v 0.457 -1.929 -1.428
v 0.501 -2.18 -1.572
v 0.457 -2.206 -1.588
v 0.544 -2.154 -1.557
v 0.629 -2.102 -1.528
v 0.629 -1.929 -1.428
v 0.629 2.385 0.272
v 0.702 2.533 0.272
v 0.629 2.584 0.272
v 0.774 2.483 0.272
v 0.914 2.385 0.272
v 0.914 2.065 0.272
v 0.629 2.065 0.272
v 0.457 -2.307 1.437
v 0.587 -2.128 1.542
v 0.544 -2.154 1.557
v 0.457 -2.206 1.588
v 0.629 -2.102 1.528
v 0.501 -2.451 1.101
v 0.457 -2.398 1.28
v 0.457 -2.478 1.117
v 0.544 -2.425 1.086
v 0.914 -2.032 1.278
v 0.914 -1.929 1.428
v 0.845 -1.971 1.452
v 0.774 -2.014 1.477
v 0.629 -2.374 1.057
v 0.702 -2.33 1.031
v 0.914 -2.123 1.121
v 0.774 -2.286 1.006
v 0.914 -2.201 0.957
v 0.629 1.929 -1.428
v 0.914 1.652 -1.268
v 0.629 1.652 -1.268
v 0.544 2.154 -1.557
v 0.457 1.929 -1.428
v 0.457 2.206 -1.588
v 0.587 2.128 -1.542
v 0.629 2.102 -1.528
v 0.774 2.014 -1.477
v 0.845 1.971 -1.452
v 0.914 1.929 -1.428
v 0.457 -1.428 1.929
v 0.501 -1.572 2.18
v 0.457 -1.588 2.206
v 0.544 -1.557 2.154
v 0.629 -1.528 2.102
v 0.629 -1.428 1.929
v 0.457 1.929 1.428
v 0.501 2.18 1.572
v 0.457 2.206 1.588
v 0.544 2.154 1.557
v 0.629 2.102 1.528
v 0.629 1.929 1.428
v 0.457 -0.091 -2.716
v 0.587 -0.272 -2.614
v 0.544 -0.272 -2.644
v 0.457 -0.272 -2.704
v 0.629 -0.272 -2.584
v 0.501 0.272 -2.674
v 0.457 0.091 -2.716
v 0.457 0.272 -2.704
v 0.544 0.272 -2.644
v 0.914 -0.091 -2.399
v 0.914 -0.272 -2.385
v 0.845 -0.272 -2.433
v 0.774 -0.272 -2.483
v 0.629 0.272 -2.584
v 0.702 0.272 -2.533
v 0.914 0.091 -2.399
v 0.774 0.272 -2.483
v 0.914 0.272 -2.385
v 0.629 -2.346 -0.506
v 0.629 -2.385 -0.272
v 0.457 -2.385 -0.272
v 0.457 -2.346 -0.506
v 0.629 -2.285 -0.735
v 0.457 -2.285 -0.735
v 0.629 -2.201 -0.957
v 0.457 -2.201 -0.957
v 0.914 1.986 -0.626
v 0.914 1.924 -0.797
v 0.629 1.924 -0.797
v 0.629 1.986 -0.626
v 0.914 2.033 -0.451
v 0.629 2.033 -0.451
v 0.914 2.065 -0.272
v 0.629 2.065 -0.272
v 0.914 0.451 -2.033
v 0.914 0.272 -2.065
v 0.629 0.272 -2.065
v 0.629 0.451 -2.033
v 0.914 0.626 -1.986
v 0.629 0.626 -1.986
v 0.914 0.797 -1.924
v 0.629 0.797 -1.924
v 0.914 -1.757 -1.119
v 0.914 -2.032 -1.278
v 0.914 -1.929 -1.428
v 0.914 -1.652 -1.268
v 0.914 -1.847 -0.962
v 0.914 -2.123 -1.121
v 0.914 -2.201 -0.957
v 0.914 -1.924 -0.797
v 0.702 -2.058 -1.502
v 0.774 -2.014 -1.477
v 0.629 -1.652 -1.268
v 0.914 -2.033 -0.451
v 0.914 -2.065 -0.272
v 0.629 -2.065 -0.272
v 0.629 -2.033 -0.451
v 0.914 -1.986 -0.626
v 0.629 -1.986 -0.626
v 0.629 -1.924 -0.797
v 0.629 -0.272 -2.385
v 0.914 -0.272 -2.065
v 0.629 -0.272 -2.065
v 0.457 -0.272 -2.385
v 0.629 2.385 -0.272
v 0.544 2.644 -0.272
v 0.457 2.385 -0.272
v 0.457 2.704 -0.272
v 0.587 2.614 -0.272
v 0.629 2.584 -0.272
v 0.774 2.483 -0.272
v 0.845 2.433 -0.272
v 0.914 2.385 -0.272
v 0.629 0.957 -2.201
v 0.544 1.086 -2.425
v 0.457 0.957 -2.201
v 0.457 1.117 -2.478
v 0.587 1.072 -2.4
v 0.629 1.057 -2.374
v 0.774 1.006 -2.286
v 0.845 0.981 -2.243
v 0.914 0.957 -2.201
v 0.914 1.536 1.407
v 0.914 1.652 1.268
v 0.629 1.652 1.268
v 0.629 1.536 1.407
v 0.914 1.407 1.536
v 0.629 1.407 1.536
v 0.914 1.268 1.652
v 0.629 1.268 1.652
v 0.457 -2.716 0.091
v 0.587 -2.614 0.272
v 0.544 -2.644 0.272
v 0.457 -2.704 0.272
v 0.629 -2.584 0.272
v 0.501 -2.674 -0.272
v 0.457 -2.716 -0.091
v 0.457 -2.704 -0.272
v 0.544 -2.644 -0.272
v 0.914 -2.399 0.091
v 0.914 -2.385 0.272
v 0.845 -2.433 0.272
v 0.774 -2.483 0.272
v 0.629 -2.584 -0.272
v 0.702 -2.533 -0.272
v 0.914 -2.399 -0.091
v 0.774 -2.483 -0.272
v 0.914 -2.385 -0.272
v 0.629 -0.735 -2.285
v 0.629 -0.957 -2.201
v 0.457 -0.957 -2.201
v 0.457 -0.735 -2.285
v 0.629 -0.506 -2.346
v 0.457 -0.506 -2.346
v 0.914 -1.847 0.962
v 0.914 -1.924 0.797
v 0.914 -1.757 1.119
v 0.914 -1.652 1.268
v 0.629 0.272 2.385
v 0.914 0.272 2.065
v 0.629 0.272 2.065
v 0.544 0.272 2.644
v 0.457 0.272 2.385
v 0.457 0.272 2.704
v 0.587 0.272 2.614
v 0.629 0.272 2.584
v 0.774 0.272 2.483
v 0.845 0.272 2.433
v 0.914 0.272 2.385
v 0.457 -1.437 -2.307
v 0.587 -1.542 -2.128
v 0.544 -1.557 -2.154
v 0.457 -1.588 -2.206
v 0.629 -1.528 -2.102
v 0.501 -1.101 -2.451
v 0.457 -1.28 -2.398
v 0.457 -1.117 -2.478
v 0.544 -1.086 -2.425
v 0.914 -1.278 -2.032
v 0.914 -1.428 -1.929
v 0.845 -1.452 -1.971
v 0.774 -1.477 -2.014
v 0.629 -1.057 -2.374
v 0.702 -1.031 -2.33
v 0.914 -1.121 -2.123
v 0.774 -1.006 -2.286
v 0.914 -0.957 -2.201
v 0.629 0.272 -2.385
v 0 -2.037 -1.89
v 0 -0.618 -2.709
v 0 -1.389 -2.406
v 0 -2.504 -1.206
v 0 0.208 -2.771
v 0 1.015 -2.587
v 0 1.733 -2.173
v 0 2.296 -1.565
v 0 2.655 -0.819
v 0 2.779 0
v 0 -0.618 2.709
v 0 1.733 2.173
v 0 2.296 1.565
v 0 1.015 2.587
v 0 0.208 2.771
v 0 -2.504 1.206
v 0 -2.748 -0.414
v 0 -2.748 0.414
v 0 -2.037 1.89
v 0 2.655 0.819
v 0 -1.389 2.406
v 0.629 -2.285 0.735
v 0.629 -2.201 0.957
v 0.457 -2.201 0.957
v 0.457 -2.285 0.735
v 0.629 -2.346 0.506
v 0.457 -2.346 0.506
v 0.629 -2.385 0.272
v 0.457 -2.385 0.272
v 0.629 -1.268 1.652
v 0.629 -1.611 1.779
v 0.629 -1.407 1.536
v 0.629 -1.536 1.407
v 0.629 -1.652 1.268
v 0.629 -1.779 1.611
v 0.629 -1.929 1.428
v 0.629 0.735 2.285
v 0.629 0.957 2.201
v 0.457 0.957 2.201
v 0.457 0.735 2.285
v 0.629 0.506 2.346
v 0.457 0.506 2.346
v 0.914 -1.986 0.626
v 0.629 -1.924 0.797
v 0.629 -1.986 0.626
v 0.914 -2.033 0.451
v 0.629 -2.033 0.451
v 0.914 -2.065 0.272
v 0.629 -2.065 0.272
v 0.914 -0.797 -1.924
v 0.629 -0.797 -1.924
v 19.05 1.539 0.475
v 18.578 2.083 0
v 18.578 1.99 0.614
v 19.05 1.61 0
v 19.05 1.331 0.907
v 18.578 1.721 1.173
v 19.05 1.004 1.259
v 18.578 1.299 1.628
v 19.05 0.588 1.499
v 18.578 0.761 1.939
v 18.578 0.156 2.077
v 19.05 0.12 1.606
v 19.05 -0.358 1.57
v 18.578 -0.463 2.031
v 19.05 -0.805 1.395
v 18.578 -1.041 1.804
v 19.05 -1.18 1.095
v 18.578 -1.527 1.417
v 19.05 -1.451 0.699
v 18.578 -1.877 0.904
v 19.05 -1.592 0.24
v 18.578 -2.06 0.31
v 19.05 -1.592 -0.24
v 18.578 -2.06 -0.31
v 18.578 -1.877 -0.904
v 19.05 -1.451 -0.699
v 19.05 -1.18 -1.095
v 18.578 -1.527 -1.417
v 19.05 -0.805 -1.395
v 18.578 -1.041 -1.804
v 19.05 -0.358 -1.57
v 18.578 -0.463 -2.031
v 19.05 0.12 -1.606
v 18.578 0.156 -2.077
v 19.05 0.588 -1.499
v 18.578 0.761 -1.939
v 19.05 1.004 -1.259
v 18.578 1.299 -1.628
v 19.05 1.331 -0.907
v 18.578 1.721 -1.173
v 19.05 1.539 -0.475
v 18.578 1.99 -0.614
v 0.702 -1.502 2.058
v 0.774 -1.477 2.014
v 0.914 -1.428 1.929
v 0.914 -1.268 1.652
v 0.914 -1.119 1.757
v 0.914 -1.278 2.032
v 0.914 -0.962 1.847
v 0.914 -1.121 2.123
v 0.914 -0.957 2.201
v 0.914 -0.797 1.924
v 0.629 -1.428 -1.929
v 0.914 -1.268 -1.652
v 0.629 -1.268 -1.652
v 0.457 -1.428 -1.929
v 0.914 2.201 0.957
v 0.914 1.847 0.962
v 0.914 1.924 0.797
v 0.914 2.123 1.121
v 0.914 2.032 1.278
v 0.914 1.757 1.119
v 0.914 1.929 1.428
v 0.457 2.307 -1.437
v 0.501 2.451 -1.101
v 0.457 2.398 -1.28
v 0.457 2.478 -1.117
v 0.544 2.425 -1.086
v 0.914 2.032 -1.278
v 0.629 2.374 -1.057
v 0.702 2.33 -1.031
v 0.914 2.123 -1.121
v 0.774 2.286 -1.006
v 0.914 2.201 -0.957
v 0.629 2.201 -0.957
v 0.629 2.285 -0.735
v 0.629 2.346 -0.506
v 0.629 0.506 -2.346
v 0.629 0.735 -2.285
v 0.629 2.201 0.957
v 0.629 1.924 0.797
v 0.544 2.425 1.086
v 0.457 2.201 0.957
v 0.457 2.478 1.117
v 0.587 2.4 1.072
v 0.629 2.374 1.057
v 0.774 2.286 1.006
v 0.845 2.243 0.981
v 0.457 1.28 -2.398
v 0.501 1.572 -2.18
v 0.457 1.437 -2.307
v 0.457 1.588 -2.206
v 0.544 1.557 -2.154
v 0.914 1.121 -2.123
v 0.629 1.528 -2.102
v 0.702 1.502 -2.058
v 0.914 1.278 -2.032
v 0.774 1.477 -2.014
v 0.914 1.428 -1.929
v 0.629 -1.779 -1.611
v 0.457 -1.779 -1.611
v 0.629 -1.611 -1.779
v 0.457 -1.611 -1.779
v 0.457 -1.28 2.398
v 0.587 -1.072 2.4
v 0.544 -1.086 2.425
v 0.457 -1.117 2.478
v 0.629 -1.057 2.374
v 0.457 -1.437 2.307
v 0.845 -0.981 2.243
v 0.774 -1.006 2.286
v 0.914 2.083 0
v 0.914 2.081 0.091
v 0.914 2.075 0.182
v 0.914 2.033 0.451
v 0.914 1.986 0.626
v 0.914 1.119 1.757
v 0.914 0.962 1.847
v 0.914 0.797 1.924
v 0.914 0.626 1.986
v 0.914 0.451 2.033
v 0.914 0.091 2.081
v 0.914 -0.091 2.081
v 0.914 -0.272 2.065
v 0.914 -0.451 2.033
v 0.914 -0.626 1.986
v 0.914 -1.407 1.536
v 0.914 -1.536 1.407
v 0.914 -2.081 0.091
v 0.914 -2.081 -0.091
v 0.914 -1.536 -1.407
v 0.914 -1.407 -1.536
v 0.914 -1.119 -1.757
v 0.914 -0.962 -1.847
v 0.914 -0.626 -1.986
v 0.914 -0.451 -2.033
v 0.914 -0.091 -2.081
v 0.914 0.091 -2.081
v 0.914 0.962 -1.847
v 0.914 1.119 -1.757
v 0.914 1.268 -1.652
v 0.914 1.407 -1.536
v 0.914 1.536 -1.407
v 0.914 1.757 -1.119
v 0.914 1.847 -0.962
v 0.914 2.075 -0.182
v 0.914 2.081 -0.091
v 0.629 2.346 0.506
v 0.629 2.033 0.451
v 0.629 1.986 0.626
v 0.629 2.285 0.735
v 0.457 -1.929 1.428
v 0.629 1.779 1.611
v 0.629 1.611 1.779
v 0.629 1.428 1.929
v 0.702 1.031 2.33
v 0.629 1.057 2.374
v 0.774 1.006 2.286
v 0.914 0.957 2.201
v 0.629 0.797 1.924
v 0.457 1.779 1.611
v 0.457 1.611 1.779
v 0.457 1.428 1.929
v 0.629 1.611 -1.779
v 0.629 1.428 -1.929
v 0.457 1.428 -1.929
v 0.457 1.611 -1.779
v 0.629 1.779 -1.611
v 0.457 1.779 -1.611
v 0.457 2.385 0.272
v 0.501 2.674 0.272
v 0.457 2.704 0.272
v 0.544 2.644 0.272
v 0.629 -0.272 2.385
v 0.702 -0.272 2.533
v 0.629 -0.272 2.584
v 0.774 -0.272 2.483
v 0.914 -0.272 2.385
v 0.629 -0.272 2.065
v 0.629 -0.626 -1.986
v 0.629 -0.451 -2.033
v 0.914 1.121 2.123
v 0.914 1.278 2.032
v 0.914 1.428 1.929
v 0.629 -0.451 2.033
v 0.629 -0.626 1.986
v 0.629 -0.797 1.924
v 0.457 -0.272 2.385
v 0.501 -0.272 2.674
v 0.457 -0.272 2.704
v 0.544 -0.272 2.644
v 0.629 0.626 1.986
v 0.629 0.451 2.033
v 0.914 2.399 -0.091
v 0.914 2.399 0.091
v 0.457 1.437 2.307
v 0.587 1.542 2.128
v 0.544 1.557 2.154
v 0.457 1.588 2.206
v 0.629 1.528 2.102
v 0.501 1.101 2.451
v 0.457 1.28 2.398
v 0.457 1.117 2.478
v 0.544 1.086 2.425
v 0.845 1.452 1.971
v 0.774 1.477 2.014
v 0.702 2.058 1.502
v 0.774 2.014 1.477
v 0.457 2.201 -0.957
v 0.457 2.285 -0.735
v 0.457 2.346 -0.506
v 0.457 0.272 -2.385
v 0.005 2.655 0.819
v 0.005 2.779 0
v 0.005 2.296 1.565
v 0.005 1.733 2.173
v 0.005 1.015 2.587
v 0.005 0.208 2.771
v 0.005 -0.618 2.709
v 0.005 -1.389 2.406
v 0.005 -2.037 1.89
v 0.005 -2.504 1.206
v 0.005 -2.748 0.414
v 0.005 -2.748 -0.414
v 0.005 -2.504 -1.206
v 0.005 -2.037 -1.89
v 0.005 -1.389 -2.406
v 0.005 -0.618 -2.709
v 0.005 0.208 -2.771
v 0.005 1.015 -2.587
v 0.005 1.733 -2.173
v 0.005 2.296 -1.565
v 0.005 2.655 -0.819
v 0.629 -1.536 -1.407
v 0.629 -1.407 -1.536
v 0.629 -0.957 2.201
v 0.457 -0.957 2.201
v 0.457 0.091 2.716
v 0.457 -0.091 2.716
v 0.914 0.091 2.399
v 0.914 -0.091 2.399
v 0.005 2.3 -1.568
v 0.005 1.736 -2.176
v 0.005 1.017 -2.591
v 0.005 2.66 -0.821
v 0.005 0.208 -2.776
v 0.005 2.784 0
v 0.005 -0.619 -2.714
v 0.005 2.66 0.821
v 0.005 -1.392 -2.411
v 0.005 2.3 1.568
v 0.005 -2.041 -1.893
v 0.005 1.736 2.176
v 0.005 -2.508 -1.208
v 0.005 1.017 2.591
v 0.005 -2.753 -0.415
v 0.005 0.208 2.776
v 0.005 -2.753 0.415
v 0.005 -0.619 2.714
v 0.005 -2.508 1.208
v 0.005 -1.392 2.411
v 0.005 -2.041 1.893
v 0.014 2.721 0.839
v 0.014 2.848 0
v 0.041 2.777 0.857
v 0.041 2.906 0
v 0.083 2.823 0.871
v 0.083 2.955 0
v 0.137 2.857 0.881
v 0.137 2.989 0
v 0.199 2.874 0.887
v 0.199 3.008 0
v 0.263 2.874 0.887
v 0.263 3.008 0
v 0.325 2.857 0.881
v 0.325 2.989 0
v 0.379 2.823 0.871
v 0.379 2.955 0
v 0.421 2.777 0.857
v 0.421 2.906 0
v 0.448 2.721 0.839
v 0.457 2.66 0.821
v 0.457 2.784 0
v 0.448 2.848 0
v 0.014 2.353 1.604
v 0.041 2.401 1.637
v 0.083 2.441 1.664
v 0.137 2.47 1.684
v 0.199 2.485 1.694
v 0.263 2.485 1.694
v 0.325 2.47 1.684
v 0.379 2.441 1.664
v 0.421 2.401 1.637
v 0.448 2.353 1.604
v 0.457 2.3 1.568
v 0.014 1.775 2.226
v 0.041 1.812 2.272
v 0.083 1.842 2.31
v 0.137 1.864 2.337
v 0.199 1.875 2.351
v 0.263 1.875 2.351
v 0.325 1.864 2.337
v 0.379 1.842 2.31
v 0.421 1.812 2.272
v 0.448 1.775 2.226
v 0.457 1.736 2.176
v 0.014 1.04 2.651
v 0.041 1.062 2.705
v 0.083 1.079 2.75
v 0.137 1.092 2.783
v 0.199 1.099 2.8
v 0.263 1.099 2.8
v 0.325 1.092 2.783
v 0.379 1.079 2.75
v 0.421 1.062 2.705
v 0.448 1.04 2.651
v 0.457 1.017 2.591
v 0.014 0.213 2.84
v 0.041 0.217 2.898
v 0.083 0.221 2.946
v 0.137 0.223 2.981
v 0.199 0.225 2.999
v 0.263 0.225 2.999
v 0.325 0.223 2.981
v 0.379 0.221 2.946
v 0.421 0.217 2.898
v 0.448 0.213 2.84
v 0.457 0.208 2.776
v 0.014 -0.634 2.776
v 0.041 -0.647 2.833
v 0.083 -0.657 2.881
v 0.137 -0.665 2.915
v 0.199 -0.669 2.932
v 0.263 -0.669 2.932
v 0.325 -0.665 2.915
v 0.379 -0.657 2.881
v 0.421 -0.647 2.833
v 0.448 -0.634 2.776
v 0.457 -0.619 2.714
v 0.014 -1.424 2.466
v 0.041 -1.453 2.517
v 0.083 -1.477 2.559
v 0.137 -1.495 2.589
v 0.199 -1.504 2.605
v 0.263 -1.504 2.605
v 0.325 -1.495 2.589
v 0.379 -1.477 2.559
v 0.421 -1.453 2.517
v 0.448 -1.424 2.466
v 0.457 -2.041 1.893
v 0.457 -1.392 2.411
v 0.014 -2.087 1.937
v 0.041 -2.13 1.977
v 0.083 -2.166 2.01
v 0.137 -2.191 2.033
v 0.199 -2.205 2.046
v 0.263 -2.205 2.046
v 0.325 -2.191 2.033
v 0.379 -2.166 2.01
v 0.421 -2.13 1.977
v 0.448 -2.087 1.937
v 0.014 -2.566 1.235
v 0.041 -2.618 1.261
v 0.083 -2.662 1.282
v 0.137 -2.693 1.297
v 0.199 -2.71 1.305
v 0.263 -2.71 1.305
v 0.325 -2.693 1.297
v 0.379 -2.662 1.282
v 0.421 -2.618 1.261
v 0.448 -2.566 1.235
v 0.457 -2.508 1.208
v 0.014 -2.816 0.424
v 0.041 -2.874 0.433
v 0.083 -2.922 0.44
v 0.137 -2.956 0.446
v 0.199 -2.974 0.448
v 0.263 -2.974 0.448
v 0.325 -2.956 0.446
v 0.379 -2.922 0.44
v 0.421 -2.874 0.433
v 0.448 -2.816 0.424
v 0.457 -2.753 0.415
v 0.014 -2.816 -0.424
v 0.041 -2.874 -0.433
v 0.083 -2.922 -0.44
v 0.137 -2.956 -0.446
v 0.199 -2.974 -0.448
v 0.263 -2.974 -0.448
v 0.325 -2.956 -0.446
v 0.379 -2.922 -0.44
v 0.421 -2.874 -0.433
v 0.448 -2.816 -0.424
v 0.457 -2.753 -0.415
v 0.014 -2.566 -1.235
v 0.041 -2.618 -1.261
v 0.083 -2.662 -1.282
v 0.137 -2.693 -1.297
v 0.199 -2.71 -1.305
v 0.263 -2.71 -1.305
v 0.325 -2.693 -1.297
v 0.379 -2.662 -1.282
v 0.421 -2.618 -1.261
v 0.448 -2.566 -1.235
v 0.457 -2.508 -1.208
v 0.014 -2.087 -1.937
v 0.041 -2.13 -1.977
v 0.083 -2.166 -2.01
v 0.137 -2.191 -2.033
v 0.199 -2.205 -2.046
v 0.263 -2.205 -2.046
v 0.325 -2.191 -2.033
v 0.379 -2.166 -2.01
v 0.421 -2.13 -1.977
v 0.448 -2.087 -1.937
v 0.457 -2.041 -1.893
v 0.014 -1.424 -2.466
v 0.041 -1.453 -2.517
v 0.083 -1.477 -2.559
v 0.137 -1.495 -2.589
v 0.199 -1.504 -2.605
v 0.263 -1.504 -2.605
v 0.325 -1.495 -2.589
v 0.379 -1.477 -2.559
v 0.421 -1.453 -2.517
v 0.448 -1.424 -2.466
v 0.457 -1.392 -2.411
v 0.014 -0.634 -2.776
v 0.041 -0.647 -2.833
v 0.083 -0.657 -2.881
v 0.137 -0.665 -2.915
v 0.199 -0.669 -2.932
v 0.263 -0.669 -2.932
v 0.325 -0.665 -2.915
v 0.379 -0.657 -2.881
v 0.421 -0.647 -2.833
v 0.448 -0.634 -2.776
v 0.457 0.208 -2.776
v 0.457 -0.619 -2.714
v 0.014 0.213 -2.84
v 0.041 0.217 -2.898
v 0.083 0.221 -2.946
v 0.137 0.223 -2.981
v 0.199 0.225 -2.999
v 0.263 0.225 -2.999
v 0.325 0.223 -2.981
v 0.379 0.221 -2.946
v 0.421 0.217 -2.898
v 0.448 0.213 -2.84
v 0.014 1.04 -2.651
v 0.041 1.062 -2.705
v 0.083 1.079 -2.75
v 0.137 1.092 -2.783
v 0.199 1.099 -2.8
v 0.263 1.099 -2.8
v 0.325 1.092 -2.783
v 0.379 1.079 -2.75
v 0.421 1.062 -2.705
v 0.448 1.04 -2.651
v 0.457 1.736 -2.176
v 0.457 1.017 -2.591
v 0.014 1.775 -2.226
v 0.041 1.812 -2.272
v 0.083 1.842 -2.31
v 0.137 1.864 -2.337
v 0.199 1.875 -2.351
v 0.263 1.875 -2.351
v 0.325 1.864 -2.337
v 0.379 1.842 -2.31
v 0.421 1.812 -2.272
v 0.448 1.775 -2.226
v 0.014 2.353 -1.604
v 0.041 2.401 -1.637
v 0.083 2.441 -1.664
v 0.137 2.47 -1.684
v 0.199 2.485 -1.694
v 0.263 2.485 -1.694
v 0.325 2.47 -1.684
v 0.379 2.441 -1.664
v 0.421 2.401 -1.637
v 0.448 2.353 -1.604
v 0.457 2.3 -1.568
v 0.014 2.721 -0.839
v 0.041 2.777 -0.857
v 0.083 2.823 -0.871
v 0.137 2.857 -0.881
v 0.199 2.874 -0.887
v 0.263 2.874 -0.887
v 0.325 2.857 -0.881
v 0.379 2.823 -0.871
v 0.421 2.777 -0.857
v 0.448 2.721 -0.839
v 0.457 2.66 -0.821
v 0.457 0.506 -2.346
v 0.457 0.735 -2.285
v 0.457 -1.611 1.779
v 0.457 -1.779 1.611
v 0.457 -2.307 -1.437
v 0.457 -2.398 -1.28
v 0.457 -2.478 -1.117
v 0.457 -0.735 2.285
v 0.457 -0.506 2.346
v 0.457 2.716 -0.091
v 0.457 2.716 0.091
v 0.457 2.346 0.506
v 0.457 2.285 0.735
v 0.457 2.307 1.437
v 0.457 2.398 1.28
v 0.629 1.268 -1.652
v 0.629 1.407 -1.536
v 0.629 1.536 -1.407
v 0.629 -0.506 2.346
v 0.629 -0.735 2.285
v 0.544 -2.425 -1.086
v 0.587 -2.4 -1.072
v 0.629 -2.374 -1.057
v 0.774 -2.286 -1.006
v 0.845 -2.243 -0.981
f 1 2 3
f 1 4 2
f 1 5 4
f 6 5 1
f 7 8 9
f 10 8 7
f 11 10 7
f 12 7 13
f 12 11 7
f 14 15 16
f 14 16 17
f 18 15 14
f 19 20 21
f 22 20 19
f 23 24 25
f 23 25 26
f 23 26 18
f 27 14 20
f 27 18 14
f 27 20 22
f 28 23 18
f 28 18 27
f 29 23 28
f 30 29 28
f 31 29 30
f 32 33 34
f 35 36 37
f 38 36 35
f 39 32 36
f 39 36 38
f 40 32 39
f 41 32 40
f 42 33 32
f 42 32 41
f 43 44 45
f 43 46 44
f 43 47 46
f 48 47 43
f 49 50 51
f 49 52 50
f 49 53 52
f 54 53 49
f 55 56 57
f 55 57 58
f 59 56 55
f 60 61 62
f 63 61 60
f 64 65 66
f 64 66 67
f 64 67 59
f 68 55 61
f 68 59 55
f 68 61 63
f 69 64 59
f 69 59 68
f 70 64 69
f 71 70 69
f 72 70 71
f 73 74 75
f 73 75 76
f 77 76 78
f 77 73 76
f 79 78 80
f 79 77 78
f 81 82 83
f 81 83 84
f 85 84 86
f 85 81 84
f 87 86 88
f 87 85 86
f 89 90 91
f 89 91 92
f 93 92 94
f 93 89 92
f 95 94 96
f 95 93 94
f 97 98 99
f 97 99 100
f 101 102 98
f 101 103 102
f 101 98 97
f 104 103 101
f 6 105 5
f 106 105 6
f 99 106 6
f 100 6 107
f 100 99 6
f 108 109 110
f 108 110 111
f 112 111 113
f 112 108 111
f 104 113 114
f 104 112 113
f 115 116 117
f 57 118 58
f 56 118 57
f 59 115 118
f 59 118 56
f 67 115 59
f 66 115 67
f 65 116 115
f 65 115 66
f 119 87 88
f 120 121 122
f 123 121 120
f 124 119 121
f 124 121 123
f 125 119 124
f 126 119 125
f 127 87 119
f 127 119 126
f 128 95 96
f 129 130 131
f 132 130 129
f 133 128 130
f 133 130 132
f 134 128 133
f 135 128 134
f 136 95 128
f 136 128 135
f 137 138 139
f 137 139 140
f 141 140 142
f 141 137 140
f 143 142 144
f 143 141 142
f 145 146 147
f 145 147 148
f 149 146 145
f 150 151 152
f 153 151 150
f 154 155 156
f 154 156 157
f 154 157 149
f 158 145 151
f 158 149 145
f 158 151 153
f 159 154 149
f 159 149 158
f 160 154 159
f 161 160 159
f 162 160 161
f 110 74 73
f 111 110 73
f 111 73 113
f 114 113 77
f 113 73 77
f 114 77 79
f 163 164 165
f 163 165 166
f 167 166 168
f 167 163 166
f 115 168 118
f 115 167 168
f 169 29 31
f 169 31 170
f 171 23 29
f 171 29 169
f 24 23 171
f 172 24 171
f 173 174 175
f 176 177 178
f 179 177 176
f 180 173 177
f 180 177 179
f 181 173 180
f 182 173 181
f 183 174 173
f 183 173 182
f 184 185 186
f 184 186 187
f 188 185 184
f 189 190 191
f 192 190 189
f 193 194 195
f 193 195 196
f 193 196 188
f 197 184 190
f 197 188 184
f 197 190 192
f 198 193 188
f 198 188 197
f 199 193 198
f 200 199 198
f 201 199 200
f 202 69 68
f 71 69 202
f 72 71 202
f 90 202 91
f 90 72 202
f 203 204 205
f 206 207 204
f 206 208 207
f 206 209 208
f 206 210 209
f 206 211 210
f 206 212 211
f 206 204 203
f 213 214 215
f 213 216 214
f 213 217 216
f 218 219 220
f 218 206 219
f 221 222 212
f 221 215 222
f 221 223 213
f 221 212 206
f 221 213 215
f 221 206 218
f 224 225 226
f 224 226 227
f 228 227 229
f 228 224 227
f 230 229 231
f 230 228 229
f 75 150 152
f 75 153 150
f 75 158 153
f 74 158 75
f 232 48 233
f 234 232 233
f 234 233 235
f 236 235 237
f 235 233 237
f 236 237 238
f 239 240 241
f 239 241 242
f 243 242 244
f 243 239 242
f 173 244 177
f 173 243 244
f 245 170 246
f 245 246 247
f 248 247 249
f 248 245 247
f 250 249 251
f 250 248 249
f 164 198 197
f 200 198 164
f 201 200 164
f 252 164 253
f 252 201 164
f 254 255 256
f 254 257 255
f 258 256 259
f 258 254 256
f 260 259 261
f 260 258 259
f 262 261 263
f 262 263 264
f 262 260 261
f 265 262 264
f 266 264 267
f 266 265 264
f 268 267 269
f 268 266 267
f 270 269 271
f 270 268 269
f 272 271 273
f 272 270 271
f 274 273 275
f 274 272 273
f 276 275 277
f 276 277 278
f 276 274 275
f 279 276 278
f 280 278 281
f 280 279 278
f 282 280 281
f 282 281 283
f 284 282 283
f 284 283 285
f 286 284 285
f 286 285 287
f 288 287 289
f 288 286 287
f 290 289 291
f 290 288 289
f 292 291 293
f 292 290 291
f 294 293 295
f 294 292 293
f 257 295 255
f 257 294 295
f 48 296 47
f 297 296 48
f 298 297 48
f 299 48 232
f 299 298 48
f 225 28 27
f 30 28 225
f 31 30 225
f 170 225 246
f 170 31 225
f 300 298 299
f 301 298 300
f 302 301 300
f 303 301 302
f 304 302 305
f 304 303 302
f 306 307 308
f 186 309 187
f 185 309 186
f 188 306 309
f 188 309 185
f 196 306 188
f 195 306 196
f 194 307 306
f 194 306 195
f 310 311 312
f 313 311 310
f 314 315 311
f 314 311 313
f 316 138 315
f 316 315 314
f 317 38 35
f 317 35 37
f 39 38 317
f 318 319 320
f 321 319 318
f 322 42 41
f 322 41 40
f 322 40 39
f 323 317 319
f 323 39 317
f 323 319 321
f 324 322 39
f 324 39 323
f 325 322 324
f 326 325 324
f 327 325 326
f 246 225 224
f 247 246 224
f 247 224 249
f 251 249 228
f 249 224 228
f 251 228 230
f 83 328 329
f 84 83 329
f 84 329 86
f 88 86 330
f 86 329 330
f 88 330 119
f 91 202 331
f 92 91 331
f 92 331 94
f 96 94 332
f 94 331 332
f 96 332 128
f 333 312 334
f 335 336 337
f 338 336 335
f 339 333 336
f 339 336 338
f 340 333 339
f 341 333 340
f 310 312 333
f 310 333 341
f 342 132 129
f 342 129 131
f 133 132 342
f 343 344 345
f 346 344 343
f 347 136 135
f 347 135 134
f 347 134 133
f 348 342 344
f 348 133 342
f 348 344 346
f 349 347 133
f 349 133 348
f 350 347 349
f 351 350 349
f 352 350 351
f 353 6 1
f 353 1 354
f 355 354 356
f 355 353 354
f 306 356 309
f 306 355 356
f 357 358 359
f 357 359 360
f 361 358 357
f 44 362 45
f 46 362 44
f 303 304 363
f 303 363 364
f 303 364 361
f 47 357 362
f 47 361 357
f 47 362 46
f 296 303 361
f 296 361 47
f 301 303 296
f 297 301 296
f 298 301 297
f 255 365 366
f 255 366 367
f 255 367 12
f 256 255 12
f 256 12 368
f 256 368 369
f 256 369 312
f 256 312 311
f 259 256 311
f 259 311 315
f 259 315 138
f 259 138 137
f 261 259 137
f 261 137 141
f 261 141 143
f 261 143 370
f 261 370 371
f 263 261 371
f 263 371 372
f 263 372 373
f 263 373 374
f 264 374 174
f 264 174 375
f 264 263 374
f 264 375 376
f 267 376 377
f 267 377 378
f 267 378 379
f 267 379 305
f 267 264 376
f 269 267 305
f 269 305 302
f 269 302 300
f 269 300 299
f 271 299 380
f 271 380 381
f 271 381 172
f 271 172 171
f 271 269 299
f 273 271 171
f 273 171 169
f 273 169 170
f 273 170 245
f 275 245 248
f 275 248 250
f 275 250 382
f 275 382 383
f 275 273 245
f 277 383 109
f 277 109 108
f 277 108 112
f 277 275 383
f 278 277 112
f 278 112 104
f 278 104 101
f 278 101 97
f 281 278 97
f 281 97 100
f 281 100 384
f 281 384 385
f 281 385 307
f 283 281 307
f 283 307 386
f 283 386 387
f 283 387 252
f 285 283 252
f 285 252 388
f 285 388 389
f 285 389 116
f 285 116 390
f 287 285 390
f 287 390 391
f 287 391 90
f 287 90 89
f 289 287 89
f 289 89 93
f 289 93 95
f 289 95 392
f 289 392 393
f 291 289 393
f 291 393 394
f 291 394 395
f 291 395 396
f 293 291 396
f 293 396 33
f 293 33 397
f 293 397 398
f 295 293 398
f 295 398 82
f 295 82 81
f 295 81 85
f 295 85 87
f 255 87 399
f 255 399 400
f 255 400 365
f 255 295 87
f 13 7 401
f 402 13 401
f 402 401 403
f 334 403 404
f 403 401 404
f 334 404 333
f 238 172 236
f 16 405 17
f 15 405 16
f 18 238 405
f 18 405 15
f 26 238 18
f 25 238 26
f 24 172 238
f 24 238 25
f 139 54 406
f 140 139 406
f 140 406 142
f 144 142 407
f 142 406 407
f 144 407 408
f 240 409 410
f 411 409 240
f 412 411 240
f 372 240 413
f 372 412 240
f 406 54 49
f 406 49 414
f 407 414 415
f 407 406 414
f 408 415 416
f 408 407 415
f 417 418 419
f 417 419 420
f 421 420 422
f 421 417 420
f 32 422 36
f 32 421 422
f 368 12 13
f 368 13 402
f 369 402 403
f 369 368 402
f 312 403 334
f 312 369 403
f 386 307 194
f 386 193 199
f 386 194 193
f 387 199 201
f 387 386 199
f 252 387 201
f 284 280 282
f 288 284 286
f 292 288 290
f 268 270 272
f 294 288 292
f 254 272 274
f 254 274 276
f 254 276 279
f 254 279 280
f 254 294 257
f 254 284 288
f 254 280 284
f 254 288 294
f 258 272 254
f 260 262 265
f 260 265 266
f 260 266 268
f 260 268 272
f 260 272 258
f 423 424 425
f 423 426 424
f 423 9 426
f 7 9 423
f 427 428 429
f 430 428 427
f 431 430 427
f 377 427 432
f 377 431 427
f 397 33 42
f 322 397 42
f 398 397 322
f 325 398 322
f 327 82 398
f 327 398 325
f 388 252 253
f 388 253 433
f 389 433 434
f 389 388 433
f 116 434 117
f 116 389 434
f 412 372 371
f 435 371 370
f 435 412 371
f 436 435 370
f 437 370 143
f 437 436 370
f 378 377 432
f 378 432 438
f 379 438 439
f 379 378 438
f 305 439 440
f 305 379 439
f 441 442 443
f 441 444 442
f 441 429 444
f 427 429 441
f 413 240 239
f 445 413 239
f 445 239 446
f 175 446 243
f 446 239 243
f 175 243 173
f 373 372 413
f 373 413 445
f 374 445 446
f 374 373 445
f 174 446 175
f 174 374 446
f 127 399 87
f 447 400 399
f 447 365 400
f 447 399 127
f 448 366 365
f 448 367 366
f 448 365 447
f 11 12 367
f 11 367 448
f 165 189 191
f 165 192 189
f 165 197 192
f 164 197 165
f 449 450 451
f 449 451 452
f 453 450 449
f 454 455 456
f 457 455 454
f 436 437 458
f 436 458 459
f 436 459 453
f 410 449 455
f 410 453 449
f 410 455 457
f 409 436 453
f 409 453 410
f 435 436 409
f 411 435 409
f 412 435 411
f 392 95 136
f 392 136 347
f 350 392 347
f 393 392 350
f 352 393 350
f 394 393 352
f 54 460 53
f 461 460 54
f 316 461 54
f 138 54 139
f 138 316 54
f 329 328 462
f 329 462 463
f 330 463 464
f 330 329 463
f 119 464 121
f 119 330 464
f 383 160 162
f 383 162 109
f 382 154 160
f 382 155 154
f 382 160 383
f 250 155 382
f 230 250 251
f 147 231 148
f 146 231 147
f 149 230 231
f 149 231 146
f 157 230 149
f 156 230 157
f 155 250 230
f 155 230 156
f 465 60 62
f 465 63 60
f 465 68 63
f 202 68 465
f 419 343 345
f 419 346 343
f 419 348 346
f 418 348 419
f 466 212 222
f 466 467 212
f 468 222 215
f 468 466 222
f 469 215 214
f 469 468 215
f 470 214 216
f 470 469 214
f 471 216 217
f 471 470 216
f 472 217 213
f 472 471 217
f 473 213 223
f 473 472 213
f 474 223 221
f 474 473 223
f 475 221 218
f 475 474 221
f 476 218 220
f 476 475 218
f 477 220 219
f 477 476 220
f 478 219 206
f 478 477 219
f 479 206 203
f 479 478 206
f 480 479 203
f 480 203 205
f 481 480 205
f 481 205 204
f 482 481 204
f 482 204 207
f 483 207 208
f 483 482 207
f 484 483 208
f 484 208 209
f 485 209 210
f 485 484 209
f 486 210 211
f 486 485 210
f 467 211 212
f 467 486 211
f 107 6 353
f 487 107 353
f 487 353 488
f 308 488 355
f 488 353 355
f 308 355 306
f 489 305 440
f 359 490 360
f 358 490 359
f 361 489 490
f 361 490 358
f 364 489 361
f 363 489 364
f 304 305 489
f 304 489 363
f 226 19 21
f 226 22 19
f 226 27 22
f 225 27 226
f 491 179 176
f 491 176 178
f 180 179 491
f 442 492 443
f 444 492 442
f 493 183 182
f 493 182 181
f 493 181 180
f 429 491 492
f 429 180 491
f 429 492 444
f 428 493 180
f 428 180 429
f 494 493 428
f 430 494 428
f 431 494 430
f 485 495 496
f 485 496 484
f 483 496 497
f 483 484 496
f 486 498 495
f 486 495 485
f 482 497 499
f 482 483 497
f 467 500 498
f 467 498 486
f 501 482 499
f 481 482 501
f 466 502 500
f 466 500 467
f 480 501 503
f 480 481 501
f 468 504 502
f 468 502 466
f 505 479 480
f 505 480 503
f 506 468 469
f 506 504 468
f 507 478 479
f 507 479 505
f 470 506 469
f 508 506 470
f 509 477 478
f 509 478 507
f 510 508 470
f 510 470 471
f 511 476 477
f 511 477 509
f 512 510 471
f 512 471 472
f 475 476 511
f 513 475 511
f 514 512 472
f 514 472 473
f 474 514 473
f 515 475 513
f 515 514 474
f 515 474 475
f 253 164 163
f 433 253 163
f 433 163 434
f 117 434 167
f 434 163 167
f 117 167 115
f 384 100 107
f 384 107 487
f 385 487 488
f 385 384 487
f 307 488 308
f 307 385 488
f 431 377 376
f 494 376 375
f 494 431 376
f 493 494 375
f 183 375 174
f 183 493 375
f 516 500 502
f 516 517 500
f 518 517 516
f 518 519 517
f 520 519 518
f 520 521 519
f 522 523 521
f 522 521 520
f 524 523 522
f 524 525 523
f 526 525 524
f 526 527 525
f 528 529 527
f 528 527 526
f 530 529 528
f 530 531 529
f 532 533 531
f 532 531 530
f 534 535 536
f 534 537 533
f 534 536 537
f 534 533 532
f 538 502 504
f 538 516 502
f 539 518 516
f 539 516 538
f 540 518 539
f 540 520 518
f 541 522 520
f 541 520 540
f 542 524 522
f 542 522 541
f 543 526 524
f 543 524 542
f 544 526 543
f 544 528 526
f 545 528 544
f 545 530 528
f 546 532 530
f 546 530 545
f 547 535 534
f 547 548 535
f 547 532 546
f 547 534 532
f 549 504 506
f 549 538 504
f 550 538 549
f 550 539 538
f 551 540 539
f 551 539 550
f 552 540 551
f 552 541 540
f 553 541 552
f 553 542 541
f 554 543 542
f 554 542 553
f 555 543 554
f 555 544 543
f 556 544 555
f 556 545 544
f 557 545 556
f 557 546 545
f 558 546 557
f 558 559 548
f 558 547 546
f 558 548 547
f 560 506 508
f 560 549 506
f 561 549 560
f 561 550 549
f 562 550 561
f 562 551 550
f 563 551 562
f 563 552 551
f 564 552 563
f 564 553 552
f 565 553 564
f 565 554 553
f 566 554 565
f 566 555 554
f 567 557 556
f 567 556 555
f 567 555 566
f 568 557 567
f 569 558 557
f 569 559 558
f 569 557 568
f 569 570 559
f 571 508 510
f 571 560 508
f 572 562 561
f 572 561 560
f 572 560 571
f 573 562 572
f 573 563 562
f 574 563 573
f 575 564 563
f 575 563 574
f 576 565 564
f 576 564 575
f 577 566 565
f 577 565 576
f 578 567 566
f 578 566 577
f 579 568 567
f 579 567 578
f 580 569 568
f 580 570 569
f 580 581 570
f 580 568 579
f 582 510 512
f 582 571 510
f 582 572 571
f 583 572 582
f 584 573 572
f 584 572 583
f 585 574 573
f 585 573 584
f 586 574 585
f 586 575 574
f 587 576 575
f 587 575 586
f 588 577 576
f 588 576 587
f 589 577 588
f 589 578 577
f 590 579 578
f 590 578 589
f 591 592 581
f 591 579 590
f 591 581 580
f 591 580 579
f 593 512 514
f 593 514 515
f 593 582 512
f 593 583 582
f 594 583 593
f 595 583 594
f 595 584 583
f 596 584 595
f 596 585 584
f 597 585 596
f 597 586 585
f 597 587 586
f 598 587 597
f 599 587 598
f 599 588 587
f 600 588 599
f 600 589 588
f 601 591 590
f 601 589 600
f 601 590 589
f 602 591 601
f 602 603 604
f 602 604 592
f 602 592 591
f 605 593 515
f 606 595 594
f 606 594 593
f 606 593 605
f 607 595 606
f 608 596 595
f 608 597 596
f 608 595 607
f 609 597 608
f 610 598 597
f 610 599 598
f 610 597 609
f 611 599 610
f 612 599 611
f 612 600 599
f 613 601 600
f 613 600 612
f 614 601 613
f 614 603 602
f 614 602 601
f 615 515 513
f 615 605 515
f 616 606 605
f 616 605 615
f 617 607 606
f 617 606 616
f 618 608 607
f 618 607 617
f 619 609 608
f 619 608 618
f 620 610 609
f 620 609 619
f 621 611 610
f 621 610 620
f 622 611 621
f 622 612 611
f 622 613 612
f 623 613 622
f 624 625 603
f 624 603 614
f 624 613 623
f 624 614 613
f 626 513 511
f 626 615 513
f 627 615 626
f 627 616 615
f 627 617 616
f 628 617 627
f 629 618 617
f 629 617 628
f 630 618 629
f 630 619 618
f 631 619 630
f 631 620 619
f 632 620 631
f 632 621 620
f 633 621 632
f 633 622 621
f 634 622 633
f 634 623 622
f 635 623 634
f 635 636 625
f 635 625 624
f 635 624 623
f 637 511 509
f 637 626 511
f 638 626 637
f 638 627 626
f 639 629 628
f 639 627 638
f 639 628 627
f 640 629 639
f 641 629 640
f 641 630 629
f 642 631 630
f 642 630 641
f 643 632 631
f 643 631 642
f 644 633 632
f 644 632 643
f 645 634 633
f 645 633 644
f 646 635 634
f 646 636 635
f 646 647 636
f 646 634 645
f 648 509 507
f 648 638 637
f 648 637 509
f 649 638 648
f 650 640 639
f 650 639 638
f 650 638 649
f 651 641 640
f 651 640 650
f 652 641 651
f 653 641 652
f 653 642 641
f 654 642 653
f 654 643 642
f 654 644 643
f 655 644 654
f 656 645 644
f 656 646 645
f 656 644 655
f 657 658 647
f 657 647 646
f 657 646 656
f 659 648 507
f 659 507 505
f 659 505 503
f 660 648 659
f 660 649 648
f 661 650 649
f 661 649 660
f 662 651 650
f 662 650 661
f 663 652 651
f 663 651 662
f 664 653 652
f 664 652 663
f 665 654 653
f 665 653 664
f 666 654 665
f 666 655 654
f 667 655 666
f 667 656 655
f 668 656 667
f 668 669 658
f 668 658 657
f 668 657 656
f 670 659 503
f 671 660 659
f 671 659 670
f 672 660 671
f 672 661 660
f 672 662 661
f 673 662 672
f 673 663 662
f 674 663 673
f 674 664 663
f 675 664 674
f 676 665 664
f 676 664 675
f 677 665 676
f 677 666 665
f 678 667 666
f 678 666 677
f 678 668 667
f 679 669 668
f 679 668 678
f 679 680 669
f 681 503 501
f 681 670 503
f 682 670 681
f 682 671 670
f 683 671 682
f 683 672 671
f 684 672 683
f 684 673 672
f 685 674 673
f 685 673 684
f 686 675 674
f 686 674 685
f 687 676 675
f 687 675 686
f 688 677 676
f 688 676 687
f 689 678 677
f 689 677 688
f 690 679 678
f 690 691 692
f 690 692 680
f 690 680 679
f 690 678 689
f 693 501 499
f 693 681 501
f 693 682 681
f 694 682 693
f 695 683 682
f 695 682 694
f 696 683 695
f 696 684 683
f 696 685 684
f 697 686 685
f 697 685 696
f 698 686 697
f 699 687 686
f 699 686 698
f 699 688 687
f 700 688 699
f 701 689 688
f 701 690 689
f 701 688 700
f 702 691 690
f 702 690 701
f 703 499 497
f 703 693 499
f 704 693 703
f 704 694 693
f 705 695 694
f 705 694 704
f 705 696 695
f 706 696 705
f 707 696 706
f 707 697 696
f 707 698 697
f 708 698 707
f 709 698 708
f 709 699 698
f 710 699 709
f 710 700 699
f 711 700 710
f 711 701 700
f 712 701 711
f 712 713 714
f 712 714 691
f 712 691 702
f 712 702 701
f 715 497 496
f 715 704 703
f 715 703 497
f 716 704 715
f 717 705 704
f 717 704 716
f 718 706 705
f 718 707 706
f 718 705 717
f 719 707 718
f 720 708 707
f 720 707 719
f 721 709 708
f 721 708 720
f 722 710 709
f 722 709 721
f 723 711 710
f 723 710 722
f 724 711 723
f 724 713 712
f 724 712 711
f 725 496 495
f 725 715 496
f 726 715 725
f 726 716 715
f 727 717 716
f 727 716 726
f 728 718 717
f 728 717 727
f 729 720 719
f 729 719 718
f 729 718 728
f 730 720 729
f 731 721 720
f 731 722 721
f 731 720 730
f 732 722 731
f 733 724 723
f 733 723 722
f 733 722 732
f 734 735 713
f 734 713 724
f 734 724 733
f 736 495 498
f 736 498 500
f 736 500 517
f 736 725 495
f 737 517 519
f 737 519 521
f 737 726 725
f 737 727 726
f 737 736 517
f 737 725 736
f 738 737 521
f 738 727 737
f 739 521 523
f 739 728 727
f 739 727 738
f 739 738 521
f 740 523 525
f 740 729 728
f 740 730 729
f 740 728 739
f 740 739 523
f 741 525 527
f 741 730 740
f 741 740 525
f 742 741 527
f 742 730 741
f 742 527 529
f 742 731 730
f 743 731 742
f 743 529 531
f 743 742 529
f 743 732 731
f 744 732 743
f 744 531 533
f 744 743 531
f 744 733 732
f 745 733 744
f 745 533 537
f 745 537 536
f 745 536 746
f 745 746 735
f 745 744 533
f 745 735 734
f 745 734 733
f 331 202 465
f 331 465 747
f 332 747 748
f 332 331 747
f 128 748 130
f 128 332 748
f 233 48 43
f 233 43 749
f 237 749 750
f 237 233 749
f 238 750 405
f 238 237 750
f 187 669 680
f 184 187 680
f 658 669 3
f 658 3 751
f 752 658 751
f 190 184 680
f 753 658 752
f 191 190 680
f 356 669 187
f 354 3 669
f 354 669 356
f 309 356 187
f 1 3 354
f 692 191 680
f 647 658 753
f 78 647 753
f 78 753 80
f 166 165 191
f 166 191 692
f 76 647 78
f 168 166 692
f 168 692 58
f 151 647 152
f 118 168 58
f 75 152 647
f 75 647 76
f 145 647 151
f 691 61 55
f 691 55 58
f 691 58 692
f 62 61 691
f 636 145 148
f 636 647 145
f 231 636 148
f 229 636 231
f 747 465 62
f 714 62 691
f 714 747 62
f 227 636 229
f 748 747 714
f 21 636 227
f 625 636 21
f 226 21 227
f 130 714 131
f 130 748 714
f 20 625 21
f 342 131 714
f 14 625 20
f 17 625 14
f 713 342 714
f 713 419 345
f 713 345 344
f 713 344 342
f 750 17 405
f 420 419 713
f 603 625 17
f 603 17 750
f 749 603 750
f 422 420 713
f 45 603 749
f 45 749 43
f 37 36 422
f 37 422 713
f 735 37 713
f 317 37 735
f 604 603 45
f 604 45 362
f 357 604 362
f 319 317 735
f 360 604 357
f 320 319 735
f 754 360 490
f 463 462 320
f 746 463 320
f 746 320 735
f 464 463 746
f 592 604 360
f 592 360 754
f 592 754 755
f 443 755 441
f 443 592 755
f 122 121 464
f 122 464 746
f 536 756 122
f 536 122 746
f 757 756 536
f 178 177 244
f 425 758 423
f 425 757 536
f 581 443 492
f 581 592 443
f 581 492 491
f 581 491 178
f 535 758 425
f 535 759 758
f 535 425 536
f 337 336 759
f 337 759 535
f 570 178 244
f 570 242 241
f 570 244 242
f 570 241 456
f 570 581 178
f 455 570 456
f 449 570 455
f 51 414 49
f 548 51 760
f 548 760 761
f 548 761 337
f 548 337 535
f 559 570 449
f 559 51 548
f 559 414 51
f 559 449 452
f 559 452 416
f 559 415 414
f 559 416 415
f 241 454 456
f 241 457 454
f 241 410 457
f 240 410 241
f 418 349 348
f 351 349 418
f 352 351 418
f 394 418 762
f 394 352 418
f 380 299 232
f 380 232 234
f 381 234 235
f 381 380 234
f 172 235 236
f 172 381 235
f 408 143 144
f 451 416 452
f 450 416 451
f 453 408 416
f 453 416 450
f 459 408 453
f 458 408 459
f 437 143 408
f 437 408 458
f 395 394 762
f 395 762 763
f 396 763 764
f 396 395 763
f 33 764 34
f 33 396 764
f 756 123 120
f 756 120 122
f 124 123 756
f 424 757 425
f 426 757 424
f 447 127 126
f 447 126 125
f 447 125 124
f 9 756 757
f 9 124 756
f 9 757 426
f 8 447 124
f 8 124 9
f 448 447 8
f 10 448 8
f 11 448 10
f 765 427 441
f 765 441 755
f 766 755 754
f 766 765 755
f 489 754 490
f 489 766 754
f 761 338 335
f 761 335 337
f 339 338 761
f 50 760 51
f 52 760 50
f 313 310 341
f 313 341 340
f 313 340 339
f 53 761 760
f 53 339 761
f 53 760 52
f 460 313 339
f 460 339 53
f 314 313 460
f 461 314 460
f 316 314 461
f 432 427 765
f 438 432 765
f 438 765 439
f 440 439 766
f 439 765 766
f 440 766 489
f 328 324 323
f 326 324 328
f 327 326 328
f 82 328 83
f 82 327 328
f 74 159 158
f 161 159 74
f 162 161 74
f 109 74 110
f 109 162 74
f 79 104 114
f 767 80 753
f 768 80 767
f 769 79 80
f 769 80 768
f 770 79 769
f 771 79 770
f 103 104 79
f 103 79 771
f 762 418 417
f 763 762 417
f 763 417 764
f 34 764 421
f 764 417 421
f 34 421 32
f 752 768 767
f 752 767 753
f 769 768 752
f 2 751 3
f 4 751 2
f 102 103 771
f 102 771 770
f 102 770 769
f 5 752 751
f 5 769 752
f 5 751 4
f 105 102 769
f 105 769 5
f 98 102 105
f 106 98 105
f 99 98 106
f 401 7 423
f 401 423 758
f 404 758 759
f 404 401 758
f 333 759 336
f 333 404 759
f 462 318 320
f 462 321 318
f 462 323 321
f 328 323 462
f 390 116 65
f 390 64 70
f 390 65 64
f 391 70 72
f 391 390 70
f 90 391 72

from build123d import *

# Parameters (mm, degrees)
RIBCUT1_DEPTH    = 0.28575
RIBCUT2_DEPTH    = 0.4572
RIBCUTSPAT_COUNT = 12
RIBCUTSPAT_ANGLE = 330


with BuildPart() as part:
    # BodySke → BaseBody (revolve)
    with BuildSketch(Plane.XY):
        with BuildLine():
            Line((0, 0), (0, 2.77876))
            Line((0, 2.77876), (0.00508, 2.77876))
            Line((0.00508, 2.77876), (0.00508, 2.78384))
            ThreePointArc((0.00508, 2.78384), (0.23114, 3.0099), (0.4572, 2.78384))
            Line((0.4572, 2.78384), (0.4572, 2.7178))
            Line((0.4572, 2.7178), (0.9144, 2.4003))
            Line((0.9144, 2.4003), (0.9144, 2.0828))
            Line((0.9144, 2.0828), (18.57756, 2.0828))
            Line((18.57756, 2.0828), (19.05, 1.61036))
            Line((19.05, 1.61036), (19.05, 0))
            Line((19.05, 0), (0, 0))
        make_face()
    revolve(axis=Axis((0, 0, 0), (1, 0, 0)))

    # RibCut1Ske → RibCut1 (cut)
    with BuildSketch(Plane(origin=(0.9144, 0, 0), x_dir=(0, 0, -1), z_dir=(1, 0, 0))):
        with BuildLine():
            Line((0.271859953, 2.064981357), (0.271859953, 2.997597401))
            ThreePointArc((0.271859953, 2.997597401), (0.779019444, 2.907340145), (1.263361075, 2.731925476))
            Line((1.263361075, 2.731925476), (0.797053053, 1.92425629))
            ThreePointArc((0.797053053, 1.92425629), (0.539068307, 2.011830311), (0.271859953, 2.064981357))
        make_face()
    ribcut1 = extrude(amount=-RIBCUT1_DEPTH, mode=Mode.SUBTRACT)

    # RibCut2Ske → RibCut2 (cut)
    with BuildSketch(Plane(origin=(0.9144, 0, 0), x_dir=(0, 0, -1), z_dir=(1, 0, 0))):
        with BuildLine():
            Line((0.271859953, 2.384854766), (0.271859953, 2.997597401))
            ThreePointArc((0.271859953, 2.997597401), (0.779019444, 2.907340145), (1.263361075, 2.731925476))
            Line((1.263361075, 2.731925476), (0.956989757, 2.201274788))
            ThreePointArc((0.956989757, 2.201274788), (0.621243354, 2.318511761), (0.271859953, 2.384854766))
        make_face()
    ribcut2 = extrude(amount=-RIBCUT2_DEPTH, mode=Mode.SUBTRACT)

    # RibCutsPat: RibCut1, RibCut2 ×12 about axis
    ribcutspat_axis = Axis((0, 0, 0), (1, 0, 0))
    for i in range(1, RIBCUTSPAT_COUNT):
        add(ribcut1.rotate(ribcutspat_axis, i * RIBCUTSPAT_ANGLE / (RIBCUTSPAT_COUNT - 1)), mode=Mode.SUBTRACT)
        add(ribcut2.rotate(ribcutspat_axis, i * RIBCUTSPAT_ANGLE / (RIBCUTSPAT_COUNT - 1)), mode=Mode.SUBTRACT)


solid = part.part
